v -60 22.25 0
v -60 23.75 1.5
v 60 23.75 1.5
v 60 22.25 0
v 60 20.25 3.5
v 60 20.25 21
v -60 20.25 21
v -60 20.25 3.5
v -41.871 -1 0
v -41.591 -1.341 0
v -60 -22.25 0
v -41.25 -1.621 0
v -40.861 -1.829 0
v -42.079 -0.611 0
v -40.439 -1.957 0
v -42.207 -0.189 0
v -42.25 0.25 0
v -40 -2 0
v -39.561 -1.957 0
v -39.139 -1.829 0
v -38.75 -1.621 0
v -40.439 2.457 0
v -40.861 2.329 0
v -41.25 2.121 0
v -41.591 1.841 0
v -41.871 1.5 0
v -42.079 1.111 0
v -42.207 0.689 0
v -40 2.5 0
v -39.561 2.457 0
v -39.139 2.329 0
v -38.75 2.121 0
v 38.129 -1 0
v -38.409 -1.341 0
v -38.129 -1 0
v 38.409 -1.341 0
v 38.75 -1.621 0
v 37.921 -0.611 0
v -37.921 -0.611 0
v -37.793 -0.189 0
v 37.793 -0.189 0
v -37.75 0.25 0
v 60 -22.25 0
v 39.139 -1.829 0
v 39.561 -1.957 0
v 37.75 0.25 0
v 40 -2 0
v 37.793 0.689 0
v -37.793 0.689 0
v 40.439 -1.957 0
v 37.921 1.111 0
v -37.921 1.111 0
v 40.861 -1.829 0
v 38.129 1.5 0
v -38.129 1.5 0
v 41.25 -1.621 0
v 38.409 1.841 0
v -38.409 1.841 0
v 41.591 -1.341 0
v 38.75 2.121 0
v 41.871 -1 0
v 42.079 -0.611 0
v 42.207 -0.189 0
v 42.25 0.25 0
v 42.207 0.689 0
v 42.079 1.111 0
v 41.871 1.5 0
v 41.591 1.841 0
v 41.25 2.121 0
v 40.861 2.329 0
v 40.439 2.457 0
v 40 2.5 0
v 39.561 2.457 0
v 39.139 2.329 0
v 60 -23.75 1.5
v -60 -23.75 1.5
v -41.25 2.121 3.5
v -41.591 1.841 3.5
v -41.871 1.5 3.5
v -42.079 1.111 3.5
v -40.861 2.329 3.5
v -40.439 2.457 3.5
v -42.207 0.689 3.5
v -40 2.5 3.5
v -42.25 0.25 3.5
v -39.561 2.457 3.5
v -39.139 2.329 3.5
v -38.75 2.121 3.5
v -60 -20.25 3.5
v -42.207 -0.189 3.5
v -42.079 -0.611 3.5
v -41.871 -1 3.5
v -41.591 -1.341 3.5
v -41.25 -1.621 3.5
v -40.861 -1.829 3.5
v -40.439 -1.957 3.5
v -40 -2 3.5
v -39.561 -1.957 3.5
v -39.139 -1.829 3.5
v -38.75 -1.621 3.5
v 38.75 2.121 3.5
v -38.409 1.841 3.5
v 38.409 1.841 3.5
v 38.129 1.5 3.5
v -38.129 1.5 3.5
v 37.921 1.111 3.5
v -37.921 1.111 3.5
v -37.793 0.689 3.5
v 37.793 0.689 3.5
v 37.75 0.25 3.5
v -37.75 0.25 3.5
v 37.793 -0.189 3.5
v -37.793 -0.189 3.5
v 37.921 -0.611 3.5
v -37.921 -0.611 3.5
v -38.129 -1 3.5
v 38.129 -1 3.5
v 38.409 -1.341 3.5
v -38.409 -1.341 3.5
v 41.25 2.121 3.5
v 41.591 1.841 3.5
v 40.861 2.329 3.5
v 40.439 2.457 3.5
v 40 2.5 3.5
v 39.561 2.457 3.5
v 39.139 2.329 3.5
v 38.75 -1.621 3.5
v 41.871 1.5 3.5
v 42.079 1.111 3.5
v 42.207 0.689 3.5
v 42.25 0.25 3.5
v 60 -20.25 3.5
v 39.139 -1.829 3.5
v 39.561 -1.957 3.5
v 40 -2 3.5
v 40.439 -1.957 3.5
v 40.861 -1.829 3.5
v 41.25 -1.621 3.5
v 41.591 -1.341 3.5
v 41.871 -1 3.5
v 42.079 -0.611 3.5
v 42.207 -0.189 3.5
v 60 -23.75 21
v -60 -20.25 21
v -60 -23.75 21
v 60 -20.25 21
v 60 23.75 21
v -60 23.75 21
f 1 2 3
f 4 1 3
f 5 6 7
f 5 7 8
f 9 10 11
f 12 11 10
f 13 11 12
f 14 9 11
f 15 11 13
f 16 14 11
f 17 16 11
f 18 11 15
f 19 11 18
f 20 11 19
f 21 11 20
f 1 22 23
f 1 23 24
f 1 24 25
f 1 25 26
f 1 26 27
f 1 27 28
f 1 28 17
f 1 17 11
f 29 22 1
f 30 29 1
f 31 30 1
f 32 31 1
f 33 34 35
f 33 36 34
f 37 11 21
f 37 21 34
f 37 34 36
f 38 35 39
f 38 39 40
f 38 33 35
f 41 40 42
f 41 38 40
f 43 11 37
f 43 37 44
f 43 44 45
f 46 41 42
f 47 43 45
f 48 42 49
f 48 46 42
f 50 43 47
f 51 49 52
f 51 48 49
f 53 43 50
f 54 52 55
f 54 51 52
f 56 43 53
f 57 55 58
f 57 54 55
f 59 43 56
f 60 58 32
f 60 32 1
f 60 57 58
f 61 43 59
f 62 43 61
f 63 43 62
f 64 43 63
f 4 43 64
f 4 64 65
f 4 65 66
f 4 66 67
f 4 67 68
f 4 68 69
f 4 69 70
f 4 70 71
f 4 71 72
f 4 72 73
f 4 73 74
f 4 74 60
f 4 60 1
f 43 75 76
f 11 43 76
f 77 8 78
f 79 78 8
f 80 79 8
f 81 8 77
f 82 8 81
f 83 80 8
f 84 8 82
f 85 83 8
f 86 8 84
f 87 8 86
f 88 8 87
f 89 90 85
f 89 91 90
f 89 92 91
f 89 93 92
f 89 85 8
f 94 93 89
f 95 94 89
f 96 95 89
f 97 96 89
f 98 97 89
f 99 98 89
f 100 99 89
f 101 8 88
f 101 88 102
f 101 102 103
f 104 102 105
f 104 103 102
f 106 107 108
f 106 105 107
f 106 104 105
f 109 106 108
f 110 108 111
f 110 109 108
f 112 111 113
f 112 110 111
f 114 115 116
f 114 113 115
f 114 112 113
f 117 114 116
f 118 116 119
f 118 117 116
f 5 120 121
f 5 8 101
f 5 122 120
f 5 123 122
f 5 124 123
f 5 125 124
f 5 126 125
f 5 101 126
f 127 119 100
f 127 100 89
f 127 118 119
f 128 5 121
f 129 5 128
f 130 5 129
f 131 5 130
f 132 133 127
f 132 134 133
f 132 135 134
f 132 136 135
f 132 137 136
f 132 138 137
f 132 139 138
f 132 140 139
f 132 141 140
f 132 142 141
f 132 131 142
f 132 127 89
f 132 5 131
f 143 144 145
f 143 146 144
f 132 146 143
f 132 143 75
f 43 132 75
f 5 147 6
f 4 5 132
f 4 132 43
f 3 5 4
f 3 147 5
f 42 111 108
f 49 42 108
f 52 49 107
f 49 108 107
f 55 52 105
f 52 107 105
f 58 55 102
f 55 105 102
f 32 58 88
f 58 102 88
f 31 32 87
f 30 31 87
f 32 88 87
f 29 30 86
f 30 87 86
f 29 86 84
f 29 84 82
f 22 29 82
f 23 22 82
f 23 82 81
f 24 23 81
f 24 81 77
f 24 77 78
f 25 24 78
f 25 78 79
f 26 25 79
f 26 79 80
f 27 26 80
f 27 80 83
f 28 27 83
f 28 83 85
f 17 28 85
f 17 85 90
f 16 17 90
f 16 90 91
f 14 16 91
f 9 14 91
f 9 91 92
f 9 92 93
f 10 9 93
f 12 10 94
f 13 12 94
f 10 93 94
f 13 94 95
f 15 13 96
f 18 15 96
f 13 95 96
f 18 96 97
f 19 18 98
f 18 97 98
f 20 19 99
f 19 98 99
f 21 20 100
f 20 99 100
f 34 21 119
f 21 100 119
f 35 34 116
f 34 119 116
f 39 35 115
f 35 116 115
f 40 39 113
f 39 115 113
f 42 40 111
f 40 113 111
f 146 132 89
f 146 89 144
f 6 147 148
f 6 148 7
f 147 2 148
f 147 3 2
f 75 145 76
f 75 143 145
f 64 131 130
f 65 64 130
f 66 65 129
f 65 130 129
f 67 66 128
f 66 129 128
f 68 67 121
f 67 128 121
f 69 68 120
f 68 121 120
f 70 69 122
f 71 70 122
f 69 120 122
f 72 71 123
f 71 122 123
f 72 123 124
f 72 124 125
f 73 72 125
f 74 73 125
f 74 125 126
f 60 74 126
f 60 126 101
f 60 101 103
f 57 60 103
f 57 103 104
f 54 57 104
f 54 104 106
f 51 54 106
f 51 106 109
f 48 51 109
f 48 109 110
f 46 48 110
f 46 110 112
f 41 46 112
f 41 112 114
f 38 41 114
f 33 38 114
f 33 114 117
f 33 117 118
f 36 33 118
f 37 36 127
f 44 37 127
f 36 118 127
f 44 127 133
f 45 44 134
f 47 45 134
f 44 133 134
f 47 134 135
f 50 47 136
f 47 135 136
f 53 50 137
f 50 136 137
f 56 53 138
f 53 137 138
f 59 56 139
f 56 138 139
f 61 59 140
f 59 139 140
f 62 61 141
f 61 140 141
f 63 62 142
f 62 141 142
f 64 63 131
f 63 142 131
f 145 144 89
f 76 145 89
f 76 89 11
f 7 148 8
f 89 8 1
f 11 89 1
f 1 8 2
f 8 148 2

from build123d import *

# Parameters (mm, degrees)
SALIENTE_EXTRUIR1_DEPTH = 60
CHAFL_N1_SIZE           = 1.5
CROQUIS3_R              = 2.25
CORTAR_EXTRUIR2_DEPTH   = 4.5


with BuildPart() as part:
    # Croquis1 → Saliente-Extruir1 (new body, symmetric)
    with BuildSketch(Plane(origin=(0, 0, 0), x_dir=(0, 0, -1), z_dir=(1, 0, 0))):
        Polygon((0, -23.75), (0, 23.75), (-21, 23.75), (-21, 20.25), (-3.5, 20.25), (-3.5, -20.25), (-21, -20.25), (-21, -23.75), align=None)
    extrude(amount=SALIENTE_EXTRUIR1_DEPTH, both=True)

    # Chaflán1
    chafl_n1_edges = [part.edges().sort_by_distance(p)[0] for p in [
        (0, 23.75, 0),
        (0, -23.75, 0),
    ]]
    chamfer(chafl_n1_edges, length=CHAFL_N1_SIZE)

    # Croquis3 → Cortar-Extruir2 (cut, through all)
    with BuildSketch(Plane.XY.offset(3.5)):
        with Locations((-40, 0.25)):
            Circle(CROQUIS3_R)
        with Locations((40, 0.25)):
            Circle(CROQUIS3_R)
    extrude(amount=-CORTAR_EXTRUIR2_DEPTH, mode=Mode.SUBTRACT)


solid = part.part
